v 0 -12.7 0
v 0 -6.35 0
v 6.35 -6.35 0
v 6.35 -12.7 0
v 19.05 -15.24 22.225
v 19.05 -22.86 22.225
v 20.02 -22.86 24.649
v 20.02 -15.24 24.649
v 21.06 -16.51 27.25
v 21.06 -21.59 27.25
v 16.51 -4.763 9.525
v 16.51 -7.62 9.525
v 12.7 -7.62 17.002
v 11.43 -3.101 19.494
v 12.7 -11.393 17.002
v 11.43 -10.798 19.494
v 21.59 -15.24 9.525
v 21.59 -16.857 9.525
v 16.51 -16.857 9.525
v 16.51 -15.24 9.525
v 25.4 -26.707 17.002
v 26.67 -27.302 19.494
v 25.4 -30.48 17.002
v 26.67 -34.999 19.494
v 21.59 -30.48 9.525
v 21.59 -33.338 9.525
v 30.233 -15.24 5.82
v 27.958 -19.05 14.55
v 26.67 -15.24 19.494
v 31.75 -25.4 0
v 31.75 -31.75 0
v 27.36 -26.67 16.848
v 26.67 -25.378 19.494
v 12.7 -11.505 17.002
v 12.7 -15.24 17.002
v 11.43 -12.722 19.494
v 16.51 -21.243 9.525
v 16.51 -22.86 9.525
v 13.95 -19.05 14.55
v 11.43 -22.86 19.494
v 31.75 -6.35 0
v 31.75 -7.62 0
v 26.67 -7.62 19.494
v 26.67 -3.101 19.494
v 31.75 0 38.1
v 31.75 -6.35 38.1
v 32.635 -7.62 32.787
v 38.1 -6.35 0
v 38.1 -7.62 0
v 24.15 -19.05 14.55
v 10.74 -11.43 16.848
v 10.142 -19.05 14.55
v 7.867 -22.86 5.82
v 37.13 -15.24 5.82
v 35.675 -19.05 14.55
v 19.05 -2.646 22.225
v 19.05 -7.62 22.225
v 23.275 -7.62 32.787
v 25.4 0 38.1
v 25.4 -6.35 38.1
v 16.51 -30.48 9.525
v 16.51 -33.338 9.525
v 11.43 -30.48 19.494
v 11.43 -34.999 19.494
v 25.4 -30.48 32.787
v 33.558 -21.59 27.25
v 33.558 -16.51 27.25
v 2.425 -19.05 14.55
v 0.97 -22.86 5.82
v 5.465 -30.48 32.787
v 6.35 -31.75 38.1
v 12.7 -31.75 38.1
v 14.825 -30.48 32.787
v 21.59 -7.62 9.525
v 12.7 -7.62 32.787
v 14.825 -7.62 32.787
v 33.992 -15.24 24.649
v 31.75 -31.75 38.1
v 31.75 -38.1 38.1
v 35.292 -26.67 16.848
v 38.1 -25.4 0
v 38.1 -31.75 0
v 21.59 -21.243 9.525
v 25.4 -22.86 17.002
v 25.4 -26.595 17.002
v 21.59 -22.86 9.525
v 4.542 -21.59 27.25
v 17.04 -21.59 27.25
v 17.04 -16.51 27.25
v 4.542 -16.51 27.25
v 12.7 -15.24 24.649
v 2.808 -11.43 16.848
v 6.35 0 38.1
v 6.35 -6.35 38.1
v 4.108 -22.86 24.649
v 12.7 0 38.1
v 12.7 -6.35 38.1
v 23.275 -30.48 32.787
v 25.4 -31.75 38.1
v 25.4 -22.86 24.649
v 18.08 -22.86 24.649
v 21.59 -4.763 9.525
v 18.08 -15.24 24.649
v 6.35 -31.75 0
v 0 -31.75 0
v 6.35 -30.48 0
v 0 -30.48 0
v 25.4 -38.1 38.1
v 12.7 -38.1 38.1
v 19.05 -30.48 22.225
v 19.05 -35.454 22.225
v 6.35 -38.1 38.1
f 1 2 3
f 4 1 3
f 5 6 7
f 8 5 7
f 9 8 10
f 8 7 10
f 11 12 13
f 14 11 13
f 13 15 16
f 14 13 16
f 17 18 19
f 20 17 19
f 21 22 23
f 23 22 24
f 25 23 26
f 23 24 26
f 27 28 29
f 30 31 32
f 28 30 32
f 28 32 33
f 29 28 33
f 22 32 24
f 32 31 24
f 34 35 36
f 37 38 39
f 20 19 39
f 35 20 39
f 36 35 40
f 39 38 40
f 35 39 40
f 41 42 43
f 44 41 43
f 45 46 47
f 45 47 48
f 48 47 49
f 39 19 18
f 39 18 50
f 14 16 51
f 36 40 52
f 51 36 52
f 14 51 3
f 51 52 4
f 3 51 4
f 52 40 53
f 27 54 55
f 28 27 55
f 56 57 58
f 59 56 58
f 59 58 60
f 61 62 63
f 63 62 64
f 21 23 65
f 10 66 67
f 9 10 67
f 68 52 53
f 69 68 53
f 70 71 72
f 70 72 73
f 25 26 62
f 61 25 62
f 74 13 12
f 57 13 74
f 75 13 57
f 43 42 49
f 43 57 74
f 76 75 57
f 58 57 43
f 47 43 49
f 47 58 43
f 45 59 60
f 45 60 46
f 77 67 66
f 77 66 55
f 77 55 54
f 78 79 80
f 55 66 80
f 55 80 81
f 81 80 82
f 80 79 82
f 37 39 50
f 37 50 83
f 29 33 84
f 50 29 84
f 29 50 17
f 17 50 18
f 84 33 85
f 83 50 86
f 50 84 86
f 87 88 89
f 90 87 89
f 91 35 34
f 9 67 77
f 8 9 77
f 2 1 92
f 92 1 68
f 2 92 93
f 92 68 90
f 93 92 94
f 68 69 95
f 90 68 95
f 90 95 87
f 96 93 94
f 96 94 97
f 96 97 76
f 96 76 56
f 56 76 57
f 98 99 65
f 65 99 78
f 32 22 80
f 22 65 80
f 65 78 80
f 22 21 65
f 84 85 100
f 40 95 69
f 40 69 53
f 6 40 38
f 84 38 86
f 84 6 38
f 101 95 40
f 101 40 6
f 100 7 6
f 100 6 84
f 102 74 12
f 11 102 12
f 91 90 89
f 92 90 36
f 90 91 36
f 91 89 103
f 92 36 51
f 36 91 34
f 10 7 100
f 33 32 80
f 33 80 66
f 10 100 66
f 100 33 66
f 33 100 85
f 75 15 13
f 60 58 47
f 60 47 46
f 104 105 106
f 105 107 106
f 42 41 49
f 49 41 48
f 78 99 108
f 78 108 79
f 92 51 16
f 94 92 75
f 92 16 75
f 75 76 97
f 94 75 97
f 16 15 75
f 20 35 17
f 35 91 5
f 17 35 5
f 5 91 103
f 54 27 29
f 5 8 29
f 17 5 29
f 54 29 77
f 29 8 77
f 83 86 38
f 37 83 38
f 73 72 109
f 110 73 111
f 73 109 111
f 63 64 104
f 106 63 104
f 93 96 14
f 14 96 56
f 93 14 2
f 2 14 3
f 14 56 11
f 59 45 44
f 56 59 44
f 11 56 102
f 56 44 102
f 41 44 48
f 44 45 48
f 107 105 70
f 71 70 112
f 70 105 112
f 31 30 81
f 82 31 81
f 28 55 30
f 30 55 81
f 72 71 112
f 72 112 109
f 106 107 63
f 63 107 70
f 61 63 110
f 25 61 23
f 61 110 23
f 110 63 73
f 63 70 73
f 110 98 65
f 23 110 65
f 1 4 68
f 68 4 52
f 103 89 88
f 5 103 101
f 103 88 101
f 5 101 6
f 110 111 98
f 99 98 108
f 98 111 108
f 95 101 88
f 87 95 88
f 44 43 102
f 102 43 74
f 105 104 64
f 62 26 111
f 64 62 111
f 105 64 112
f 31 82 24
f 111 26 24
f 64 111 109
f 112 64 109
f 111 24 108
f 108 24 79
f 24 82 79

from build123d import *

# Parameters (mm, degrees)
F0_W      = 38.1
F0_H      = 38.1
F1_DEPTH  = 38.1
F6_DEPTH  = 38.1
F8_DEPTH  = 38.1
F9_W      = 25.4
F9_H      = 7.62
F10_DEPTH = 38.1


with BuildPart() as f1:
    # F0 (on Front) → F1 (new body)
    with BuildSketch(Plane.XZ):
        with Locations((19.05, 19.05)):
            Rectangle(F0_W, F0_H)
    extrude(amount=F1_DEPTH)

    # F5 (on offset) → F6 (cut)
    with BuildSketch(Plane.YZ.offset(38.1)):
        Polygon((-6.35, 38.1), (-31.75, 38.1), (-26.67, 16.848067), (-21.59, 27.249678), (-16.51, 27.249678), (-11.43, 16.848067), align=None)
        Polygon((-31.75, 0), (-38.1, 38.1), (-38.1, 0), align=None)
        Polygon((-19.05, 14.549678), (-25.4, 0), (-12.7, 0), align=None)
        Polygon((0, 0), (0, 38.1), (-6.35, 0), align=None)
    extrude(amount=-F6_DEPTH, mode=Mode.SUBTRACT)

    # F7 (on offset) → F8 (cut)
    with BuildSketch(Plane.XZ.offset(38.1)):
        Polygon((25.4, 38.1), (12.7, 38.1), (19.05, 22.225), align=None)
        Polygon((0, 38.1), (0, 0), (6.35, 38.1), align=None)
        Polygon((31.75, 38.1), (38.1, 0), (38.1, 38.1), align=None)
        Polygon((11.43, 19.493997), (6.35, 0), (31.75, 0), (26.67, 19.493997), (21.59, 9.525), (16.51, 9.525), align=None)
    extrude(amount=-F8_DEPTH, mode=Mode.SUBTRACT)

    # F9 (on offset) → F10 (cut)
    with BuildSketch(Plane.XY.offset(38.1)):
        with Locations((25.4, -11.43)):
            Rectangle(F9_W, F9_H)
        with Locations((12.7, -26.67)):
            Rectangle(F9_W, F9_H)
    extrude(amount=-F10_DEPTH, mode=Mode.SUBTRACT)


solid = f1.part
